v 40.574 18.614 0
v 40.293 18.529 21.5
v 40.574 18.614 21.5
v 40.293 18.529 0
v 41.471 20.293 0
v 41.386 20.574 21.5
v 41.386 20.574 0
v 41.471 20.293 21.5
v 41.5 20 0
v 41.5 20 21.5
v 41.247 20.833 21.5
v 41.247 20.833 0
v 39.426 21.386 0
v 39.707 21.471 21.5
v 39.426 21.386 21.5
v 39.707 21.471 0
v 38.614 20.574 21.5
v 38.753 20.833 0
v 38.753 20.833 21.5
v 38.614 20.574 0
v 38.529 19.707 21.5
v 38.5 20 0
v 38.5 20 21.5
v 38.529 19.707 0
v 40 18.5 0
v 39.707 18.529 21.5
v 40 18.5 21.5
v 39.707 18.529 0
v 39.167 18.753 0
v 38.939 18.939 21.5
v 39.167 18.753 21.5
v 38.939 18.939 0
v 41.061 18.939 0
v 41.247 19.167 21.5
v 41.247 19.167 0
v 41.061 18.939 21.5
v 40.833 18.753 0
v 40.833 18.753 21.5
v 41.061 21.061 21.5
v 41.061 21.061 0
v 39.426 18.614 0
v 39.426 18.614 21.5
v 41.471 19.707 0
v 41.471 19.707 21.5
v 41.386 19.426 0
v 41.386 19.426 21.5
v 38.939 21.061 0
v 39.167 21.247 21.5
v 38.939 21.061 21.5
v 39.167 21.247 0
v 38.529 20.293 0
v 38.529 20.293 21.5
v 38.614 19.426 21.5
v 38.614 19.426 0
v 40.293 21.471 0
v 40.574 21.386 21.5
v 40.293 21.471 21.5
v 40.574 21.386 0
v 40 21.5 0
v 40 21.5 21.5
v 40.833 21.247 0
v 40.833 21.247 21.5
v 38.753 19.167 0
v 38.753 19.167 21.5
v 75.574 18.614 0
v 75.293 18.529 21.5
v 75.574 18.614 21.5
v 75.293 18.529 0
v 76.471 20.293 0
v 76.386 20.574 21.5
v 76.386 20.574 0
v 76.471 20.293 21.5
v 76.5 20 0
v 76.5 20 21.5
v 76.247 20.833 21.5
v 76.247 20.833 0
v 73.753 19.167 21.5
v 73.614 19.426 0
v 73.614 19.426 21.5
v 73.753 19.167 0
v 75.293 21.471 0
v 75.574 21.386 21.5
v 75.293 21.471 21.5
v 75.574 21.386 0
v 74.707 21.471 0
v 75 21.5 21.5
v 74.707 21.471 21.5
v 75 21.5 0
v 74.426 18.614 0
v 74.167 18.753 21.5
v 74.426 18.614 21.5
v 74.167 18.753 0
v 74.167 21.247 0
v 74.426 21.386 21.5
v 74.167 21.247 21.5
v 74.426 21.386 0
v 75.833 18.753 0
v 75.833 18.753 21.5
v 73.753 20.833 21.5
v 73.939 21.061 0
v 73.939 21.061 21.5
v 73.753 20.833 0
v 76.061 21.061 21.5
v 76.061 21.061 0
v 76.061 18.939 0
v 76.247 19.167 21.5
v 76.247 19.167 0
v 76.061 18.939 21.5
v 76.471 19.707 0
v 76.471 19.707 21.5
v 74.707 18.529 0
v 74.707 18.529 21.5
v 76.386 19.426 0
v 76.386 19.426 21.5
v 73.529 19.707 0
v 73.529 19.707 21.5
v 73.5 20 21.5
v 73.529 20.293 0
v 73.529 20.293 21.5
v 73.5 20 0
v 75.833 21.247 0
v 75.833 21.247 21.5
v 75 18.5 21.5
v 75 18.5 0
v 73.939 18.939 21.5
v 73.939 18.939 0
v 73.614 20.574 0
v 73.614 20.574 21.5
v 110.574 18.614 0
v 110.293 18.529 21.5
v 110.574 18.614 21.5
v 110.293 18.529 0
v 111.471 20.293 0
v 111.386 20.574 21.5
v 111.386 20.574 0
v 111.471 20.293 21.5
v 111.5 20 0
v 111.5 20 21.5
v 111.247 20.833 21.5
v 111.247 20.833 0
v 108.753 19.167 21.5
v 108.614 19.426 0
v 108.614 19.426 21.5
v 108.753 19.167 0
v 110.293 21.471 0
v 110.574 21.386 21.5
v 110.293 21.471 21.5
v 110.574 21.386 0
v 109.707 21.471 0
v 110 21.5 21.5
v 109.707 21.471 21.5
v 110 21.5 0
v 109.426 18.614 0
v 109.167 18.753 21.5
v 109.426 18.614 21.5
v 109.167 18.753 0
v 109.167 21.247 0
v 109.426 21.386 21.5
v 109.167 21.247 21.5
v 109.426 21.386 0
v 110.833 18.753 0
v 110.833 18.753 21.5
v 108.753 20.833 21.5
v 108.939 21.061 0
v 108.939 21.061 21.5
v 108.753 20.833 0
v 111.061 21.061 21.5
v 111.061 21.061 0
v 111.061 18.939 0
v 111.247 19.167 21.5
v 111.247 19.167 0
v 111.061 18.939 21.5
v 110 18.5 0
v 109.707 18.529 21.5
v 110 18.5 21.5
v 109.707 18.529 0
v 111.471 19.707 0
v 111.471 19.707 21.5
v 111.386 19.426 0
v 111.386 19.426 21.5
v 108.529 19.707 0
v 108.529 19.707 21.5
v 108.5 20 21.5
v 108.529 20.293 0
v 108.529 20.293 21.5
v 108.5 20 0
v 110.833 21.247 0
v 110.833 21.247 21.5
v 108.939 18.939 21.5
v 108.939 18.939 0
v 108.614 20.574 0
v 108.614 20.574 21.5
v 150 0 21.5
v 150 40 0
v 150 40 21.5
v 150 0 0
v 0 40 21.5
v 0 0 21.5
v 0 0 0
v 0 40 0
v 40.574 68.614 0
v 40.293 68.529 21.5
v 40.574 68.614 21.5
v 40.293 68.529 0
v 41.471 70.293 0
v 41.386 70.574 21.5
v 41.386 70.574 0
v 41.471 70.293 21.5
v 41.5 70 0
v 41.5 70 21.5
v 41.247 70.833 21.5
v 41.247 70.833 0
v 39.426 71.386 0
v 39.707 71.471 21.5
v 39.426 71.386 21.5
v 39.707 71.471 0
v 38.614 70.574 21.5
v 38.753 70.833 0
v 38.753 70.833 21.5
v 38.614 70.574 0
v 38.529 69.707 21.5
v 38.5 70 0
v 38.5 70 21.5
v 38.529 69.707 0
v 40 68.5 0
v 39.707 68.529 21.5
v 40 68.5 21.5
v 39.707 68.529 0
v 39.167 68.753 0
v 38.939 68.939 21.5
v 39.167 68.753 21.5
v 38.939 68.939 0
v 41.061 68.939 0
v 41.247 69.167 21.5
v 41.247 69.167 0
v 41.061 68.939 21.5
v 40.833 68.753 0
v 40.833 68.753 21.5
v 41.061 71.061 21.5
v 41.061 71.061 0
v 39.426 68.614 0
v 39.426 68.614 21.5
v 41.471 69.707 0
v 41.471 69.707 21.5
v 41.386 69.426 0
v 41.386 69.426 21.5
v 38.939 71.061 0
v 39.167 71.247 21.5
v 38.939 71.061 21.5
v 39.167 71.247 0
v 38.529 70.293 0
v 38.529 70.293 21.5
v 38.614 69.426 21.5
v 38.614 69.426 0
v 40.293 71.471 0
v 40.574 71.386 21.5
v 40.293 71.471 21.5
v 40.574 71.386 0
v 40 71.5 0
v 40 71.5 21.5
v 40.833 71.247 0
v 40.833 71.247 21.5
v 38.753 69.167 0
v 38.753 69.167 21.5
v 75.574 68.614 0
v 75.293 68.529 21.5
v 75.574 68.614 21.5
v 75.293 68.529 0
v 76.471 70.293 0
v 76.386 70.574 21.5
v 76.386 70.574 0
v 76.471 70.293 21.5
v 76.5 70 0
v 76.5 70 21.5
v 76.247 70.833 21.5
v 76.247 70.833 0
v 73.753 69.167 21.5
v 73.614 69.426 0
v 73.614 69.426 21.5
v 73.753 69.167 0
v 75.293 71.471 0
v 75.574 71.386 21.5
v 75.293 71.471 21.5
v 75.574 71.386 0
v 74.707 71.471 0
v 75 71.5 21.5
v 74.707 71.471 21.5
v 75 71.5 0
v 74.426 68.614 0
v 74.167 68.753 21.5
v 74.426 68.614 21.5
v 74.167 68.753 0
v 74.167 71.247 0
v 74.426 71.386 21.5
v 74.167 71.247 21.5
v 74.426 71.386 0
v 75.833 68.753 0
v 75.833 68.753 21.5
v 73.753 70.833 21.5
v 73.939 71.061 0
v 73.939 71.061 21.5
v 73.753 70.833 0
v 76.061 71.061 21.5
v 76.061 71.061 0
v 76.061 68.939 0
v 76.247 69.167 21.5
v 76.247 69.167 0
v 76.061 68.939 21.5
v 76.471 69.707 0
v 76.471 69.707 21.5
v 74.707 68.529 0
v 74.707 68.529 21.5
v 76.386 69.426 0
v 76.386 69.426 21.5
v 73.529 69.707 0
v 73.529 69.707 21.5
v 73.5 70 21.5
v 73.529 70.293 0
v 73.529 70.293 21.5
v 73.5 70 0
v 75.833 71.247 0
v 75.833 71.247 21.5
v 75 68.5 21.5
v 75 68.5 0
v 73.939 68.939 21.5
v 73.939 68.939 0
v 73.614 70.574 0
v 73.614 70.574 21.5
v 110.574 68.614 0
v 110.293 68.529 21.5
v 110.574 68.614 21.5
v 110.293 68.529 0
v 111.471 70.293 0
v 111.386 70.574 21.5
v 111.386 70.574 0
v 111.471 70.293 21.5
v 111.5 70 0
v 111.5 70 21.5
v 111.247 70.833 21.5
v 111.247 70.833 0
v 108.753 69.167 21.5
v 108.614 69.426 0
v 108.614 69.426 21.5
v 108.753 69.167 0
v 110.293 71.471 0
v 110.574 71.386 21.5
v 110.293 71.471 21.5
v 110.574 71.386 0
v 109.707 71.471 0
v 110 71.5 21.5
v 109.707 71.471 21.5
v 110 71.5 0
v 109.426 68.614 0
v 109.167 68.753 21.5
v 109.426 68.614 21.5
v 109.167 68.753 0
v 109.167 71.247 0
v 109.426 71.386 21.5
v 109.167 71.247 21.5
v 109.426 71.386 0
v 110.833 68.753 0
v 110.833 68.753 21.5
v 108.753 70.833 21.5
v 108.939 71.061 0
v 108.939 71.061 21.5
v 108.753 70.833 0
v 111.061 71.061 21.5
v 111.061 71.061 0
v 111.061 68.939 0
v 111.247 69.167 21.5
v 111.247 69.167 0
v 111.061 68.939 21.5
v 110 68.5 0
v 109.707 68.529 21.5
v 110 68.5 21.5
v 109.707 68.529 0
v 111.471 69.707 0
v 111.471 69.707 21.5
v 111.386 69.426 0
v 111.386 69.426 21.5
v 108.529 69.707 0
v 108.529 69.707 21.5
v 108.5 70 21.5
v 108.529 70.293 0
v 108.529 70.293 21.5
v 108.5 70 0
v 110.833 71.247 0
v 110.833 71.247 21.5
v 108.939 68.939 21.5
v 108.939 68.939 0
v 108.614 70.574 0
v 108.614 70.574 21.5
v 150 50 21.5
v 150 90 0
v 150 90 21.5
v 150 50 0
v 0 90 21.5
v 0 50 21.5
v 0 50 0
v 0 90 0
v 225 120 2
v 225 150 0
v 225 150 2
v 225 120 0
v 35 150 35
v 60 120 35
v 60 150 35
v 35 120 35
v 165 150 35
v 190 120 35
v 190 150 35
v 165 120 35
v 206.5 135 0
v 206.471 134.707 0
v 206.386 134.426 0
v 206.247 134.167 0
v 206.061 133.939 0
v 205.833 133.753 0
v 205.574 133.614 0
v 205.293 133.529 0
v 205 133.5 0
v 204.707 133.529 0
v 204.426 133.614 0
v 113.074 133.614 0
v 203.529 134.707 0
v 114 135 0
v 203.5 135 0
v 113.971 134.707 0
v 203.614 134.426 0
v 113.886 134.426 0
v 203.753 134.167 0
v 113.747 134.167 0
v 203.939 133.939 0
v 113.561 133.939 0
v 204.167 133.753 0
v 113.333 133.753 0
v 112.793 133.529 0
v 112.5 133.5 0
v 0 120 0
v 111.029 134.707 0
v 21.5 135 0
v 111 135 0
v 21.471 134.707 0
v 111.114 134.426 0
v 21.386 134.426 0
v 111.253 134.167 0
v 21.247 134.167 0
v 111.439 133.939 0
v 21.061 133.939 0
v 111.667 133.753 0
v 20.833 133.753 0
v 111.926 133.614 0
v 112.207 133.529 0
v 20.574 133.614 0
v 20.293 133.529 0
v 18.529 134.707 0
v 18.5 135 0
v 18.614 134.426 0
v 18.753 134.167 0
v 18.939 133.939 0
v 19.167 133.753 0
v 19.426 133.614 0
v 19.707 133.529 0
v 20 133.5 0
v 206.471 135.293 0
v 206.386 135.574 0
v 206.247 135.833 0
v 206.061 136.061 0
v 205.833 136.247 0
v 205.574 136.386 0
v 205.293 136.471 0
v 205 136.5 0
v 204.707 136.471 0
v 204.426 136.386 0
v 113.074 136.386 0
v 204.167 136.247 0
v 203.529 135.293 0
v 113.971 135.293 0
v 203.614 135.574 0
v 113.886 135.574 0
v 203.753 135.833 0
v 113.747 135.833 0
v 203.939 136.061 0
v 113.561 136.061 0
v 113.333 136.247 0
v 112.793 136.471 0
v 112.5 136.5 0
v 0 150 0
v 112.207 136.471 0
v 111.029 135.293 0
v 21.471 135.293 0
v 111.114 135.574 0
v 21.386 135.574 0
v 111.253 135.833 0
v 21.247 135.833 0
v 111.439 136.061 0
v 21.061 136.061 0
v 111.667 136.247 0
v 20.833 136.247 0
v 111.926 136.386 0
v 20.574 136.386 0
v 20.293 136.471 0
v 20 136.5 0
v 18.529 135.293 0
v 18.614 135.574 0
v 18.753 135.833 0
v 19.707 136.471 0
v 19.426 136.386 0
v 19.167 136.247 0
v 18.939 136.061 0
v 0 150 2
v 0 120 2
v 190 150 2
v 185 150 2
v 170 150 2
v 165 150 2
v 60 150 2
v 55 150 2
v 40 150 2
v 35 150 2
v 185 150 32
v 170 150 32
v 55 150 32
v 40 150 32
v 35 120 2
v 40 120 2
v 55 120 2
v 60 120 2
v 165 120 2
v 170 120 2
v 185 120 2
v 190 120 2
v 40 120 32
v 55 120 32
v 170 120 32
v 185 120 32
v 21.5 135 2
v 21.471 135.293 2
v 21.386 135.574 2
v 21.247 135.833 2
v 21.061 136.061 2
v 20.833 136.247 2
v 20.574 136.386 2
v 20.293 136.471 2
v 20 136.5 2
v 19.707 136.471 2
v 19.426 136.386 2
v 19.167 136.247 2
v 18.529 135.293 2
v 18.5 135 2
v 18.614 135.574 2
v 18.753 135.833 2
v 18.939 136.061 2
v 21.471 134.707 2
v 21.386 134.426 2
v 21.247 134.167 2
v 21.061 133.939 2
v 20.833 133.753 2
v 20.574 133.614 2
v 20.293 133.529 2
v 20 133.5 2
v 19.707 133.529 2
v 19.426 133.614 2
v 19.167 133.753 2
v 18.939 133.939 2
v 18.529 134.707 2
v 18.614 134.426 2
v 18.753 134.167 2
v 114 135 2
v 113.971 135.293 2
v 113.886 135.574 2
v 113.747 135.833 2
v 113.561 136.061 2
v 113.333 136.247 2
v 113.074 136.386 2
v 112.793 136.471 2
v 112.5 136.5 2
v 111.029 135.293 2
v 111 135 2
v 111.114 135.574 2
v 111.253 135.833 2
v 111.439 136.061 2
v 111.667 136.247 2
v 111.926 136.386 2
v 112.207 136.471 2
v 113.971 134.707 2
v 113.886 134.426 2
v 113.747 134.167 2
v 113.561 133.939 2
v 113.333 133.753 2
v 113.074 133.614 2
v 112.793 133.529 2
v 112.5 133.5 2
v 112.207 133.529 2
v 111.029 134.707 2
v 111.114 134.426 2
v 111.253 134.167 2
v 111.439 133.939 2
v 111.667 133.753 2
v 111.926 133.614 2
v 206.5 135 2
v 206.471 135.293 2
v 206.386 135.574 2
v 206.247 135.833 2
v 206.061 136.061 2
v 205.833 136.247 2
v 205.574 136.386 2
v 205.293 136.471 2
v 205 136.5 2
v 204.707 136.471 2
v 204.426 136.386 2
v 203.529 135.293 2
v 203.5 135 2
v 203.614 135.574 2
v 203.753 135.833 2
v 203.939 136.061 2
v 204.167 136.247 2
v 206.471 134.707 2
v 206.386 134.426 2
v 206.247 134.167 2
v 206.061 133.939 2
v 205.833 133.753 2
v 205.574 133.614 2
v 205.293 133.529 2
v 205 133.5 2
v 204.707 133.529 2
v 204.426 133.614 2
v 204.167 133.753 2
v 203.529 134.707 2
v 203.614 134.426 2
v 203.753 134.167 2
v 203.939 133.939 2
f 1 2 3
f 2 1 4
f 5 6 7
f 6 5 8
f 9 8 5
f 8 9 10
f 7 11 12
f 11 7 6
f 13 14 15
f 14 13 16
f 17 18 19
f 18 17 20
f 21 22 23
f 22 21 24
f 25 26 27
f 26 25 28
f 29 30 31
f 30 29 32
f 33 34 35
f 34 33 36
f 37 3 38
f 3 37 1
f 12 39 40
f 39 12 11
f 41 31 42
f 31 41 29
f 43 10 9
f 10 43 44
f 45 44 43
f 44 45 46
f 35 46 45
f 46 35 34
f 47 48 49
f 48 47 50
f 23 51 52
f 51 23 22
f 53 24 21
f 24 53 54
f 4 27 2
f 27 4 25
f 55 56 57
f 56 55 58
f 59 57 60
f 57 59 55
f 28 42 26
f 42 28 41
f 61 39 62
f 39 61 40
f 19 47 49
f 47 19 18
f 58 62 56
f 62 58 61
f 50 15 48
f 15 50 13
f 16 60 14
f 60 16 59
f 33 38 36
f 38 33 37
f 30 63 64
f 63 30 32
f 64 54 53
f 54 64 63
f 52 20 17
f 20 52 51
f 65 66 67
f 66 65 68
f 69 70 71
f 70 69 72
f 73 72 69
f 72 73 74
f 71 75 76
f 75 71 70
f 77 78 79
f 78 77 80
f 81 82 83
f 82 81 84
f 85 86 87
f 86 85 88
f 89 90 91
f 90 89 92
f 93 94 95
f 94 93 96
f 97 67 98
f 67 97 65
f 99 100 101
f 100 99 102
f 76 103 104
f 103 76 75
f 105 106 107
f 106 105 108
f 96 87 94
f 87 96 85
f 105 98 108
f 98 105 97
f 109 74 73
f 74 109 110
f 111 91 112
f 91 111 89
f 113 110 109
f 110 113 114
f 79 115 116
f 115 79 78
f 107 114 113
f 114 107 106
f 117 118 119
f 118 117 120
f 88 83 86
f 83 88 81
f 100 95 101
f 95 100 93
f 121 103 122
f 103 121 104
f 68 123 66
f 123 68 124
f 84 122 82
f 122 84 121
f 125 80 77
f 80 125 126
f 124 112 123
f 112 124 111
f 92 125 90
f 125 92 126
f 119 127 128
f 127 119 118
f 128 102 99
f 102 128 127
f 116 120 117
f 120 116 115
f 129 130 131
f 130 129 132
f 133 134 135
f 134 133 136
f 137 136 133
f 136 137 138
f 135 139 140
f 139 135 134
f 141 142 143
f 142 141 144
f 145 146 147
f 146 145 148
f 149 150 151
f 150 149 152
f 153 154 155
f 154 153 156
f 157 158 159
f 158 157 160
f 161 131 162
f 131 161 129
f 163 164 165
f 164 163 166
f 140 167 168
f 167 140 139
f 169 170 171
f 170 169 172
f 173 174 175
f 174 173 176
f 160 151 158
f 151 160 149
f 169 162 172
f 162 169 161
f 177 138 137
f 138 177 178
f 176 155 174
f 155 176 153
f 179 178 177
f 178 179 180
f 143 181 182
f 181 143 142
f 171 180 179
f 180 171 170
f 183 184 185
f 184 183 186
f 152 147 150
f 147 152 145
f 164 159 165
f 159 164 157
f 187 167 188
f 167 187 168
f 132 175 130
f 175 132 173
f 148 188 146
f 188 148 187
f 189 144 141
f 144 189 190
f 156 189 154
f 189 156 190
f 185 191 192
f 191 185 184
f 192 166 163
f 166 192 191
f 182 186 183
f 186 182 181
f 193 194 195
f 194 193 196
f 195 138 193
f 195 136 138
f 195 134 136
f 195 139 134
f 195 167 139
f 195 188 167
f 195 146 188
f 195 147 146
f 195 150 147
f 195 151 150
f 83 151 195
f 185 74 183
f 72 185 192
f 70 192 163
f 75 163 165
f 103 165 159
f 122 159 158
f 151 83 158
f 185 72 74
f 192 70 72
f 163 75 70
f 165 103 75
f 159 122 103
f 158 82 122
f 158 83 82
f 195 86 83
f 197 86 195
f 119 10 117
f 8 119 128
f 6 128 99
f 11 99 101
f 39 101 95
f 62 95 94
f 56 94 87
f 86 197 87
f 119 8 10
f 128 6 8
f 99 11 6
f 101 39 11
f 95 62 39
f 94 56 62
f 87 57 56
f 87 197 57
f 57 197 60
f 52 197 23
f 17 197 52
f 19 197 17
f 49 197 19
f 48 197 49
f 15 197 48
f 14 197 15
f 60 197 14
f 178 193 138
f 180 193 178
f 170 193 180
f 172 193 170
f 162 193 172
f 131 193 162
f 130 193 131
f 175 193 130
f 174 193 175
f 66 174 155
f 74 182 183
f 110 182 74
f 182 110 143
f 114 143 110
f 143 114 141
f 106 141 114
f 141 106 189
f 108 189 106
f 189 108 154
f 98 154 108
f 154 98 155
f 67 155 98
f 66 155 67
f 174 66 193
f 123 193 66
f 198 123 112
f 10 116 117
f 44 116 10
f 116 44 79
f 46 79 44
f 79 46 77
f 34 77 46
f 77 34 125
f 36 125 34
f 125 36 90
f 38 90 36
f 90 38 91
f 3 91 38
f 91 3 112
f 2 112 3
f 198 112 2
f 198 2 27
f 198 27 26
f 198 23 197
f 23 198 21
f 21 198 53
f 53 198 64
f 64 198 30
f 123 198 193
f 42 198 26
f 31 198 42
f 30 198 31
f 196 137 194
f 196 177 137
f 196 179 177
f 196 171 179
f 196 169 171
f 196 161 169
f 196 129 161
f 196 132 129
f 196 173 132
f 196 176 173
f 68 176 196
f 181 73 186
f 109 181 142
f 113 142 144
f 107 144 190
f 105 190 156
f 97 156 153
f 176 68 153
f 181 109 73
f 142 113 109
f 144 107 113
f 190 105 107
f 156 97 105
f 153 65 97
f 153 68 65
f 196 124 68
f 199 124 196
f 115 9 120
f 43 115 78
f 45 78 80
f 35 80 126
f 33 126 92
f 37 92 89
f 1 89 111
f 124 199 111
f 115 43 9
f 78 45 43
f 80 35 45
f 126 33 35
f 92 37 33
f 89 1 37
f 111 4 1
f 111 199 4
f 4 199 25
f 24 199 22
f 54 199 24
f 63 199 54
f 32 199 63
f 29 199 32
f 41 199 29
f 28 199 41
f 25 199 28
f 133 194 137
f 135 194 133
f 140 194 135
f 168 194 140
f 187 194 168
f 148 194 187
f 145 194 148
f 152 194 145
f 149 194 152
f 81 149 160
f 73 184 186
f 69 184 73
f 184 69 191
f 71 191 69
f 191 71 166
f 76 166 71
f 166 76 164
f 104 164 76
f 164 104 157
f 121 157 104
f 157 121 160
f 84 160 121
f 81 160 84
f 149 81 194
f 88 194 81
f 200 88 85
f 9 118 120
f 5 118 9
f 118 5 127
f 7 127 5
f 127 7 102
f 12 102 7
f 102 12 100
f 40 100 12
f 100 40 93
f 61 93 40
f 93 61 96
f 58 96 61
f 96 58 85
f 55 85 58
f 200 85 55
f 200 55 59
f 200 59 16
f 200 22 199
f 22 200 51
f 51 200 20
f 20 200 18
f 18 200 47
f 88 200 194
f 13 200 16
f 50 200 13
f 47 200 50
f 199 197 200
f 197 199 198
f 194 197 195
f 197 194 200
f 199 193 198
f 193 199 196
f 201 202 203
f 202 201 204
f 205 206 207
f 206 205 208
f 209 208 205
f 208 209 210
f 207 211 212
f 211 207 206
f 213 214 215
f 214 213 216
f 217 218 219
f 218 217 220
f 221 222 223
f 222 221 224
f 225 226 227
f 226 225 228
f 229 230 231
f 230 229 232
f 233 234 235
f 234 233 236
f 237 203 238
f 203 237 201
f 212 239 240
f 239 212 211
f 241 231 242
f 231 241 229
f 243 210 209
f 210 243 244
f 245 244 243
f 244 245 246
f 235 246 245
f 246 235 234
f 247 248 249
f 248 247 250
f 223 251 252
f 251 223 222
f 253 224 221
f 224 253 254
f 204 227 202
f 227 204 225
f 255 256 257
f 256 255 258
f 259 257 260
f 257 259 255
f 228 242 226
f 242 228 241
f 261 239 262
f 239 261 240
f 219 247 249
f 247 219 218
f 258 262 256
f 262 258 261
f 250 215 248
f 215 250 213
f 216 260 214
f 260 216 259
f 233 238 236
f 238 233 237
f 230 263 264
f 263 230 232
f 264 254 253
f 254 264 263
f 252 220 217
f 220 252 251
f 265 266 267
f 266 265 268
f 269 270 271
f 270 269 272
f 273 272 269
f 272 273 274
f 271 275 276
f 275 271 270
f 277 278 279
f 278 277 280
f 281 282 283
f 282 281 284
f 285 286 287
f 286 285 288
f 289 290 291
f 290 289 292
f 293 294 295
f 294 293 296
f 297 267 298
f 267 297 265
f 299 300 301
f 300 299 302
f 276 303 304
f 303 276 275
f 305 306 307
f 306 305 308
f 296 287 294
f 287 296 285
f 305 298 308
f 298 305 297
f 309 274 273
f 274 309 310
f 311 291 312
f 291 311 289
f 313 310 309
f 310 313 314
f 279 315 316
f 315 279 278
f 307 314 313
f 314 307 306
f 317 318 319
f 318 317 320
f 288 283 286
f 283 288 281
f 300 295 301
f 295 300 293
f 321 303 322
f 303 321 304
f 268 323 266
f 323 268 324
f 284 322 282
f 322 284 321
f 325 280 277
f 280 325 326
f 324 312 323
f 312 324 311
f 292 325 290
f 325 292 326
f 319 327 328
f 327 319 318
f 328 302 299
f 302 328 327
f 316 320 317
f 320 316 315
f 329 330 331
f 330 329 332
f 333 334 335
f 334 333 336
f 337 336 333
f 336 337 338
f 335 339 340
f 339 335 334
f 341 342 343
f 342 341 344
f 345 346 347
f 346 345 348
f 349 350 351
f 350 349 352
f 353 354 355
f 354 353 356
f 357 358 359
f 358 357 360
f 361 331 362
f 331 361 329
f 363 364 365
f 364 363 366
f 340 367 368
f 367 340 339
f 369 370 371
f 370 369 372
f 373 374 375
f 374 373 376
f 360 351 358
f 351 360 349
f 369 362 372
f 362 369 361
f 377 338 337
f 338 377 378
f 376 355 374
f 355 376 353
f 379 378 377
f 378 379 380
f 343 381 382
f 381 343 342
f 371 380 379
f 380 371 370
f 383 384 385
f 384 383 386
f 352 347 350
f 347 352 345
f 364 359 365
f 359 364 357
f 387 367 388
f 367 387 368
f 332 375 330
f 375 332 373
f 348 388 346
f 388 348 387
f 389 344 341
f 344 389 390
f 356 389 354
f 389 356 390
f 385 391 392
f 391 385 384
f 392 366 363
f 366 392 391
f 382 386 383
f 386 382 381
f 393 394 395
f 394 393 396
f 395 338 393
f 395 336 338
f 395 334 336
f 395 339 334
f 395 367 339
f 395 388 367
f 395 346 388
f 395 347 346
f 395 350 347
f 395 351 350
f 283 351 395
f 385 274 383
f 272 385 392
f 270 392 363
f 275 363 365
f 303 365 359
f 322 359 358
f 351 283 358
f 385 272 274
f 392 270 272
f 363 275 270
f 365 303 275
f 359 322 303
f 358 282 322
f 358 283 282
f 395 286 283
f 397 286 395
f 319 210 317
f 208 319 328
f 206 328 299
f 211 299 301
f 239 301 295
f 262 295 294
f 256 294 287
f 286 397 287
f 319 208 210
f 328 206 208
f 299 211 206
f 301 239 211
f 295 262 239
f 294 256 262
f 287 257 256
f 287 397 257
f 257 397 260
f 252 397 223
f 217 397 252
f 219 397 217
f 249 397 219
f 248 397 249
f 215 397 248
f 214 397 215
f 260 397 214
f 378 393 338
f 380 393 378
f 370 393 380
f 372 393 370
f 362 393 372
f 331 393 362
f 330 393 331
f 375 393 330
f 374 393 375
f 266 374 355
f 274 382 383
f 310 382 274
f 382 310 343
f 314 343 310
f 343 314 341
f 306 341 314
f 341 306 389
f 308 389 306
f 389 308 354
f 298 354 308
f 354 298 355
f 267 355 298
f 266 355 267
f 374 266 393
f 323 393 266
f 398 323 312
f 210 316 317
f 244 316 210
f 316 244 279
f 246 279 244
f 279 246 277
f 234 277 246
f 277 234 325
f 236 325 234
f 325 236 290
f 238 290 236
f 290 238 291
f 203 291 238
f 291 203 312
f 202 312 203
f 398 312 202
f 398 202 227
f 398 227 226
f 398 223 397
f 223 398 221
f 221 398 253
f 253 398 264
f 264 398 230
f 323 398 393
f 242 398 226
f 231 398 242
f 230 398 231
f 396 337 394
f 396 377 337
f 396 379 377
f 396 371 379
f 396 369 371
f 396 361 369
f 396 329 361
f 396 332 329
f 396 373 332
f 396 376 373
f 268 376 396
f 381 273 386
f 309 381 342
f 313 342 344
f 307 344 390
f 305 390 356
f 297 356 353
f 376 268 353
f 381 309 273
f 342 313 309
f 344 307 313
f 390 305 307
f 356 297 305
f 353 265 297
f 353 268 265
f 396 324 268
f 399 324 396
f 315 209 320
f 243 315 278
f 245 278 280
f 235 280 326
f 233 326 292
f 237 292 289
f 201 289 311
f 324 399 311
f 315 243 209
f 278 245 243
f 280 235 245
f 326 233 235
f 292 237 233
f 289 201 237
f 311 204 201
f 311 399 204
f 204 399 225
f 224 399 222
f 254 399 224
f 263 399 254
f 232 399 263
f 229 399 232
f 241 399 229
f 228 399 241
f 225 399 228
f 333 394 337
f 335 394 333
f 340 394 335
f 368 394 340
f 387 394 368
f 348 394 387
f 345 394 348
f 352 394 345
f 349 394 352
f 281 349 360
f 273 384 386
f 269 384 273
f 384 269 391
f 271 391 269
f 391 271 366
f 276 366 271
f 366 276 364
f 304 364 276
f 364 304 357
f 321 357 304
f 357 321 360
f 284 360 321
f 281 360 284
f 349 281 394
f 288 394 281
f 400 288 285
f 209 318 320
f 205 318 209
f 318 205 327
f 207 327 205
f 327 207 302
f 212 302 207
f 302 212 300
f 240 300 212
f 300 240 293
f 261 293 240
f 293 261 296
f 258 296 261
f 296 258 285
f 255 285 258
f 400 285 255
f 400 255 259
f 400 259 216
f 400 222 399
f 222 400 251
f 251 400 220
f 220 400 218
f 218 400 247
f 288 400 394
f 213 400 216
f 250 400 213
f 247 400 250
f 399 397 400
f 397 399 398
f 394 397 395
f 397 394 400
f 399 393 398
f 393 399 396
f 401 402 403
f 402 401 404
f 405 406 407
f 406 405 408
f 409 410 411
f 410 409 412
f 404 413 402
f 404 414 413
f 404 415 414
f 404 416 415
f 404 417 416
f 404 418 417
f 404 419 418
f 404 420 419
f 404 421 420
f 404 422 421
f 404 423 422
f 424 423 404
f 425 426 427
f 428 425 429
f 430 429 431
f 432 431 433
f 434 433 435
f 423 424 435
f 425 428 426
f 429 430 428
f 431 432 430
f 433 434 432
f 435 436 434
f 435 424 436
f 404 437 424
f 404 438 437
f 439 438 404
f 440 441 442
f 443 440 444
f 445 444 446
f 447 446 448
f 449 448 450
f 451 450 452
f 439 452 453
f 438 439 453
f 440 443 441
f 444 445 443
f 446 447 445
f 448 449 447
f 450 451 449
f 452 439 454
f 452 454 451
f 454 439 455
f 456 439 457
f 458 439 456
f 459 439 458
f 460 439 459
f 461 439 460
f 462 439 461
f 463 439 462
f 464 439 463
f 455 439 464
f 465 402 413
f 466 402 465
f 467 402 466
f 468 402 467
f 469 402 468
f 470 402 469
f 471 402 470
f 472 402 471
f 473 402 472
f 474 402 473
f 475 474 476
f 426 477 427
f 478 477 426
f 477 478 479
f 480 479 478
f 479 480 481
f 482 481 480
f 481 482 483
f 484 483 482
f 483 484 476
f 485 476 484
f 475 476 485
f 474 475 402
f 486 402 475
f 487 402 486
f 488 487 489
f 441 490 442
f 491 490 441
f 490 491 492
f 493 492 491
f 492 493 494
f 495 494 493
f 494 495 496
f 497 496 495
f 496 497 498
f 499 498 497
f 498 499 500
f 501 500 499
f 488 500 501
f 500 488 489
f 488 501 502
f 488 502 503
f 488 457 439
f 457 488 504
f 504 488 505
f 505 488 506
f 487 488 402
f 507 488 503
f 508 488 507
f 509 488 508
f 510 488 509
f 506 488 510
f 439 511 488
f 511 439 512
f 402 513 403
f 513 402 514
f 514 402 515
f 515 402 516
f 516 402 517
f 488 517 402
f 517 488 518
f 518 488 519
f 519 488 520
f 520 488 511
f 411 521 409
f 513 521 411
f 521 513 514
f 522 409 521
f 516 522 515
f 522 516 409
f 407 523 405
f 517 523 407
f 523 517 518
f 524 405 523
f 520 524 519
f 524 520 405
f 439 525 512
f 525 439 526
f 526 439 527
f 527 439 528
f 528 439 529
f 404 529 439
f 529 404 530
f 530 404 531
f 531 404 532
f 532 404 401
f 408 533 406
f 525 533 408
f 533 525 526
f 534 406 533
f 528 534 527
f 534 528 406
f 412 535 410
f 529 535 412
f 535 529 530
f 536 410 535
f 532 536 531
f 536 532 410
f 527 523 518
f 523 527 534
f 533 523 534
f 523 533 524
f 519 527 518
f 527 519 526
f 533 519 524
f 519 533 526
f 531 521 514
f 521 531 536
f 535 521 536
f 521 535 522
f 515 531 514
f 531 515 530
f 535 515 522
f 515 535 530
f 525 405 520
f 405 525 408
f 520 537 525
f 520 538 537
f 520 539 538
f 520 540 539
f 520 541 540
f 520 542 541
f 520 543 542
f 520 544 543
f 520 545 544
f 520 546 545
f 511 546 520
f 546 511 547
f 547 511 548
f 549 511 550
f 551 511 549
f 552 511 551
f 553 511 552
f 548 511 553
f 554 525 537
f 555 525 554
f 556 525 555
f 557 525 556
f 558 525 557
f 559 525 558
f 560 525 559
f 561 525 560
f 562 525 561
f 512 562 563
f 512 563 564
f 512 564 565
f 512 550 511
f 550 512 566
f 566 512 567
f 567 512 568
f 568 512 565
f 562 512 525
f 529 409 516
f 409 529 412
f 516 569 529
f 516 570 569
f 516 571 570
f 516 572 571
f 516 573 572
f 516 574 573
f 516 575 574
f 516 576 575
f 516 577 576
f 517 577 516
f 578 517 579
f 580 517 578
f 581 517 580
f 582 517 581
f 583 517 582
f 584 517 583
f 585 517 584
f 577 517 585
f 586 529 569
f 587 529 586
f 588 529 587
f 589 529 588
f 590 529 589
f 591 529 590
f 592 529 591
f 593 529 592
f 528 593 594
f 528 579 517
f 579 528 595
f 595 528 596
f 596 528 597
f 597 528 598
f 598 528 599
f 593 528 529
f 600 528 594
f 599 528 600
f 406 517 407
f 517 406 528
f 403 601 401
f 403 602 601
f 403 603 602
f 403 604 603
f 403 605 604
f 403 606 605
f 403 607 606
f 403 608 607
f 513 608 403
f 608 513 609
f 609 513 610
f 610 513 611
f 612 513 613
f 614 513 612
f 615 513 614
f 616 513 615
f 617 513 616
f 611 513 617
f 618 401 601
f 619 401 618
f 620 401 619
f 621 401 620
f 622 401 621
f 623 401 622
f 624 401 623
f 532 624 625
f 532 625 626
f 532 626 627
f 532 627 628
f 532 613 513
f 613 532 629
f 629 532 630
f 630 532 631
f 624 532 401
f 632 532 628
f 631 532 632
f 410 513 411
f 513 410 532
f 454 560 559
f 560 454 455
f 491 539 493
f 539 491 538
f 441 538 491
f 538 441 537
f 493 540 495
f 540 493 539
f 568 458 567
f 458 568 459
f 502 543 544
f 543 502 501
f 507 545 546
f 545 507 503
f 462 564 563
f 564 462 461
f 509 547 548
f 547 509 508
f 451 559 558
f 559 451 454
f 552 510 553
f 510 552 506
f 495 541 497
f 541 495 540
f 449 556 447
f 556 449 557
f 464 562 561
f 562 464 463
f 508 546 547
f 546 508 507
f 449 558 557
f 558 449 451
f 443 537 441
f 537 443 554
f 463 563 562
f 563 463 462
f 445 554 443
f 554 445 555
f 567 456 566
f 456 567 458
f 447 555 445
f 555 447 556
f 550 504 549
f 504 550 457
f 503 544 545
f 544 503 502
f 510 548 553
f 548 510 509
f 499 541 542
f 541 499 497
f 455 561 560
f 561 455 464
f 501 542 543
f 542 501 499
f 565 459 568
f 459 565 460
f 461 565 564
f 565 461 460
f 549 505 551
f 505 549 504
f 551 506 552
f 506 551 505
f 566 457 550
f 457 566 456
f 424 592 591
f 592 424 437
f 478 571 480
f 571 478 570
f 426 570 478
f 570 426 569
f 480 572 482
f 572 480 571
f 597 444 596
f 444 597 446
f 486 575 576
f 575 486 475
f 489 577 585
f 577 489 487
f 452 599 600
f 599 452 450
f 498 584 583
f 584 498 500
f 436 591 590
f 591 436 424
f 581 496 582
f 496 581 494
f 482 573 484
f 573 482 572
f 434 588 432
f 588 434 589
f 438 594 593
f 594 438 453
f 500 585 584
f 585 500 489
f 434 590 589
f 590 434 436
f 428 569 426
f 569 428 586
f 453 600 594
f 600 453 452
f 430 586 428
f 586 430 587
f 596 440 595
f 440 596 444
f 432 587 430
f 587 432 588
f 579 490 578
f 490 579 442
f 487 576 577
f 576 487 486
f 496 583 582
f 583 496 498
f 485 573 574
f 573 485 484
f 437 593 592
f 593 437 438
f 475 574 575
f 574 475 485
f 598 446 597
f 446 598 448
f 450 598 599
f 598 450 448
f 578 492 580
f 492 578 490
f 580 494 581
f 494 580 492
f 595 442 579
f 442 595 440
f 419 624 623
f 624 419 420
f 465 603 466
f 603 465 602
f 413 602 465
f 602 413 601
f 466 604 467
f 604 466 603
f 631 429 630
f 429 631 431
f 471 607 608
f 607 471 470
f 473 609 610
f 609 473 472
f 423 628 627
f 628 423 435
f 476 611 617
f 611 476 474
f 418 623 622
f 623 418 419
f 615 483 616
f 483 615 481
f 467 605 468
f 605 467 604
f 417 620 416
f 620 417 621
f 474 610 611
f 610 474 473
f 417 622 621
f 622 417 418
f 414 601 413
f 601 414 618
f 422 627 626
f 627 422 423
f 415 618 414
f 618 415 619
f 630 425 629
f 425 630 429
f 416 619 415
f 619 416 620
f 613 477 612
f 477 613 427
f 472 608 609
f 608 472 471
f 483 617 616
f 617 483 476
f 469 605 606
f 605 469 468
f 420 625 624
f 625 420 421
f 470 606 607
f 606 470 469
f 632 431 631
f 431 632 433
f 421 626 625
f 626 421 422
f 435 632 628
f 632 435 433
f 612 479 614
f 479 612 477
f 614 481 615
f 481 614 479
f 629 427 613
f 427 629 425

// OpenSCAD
// Table support blocks — 3 variants
// Fits under table edge, prints along Bambu Lab A1 bed

length     = 150;  // 15cm
width      = 40;   // 4cm
hole_d     = 3;    // pilot hole for ~4mm wood screw — threads grip plastic
hole_gap   = 35;   // center-to-center spacing
hole_count = 3;

module support(h) {
    difference() {
        cube([length, width, h]);
        for (i = [0 : hole_count - 1]) {
            x = length/2 + (i - (hole_count-1)/2) * hole_gap;
            translate([x, width/2, -1])
                cylinder(h = h + 2, d = hole_d, $fn = 32);
        }
    }
}

// two identical 21.5mm pieces, spaced apart in Y
support(21.5);
translate([0, width + 10, 0]) support(21.5);

// two beams: 30x15mm cross-section, 40mm long, 110mm apart center-to-center
beam_w      = 30;
beam_h      = 15;
beam_len    = 40;
beam_gap    = 130;  // 115mm face-to-face + 15mm beam width

module beam() {
    cube([beam_h, beam_len, beam_w]);
}

channel_floor = 2;                                    // floor under beams
channel_top   = 3;                                    // wall above beams
channel_ext   = 40;                                   // end flap length for screwing down
channel_x     = beam_gap + beam_h + channel_ext * 2; // 185mm
channel_y     = 30;                                   // 3cm deep
channel_z     = channel_floor + beam_w + channel_top; // 35mm — fully enclosed

module channel_piece() {
    difference() {
        cube([channel_x, channel_y, channel_z]);

        // beam tunnels — enclosed, open front/back
        translate([channel_ext, -1, channel_floor])
            cube([beam_h, channel_y + 2, beam_w]);
        translate([channel_ext + beam_gap, -1, channel_floor])
            cube([beam_h, channel_y + 2, beam_w]);

        channel_wall = 5; // wall thickness around each beam tunnel

        // cut down left flat (_)
        translate([-1, -1, channel_floor])
            cube([channel_ext - channel_wall + 1, channel_y + 2, channel_z]);
        // cut down middle flat (___)
        translate([channel_ext + beam_h + channel_wall, -1, channel_floor])
            cube([beam_gap - beam_h - channel_wall * 2, channel_y + 2, channel_z]);
        // cut down right flat (_)
        translate([channel_ext + beam_gap + beam_h + channel_wall, -1, channel_floor])
            cube([channel_ext - channel_wall + 1, channel_y + 2, channel_z]);

        // screw holes through each platform floor
        translate([channel_ext / 2, channel_y / 2, -1])
            cylinder(h = channel_floor + 2, d = hole_d, $fn = 32);
        translate([channel_ext + beam_h + (beam_gap - beam_h) / 2, channel_y / 2, -1])
            cylinder(h = channel_floor + 2, d = hole_d, $fn = 32);
        translate([channel_ext + beam_gap + beam_h + channel_ext / 2, channel_y / 2, -1])
            cylinder(h = channel_floor + 2, d = hole_d, $fn = 32);
    }
}

channel_y_offset = (width + 10) * 2 + 20;
translate([0, channel_y_offset, 0]) channel_piece();
